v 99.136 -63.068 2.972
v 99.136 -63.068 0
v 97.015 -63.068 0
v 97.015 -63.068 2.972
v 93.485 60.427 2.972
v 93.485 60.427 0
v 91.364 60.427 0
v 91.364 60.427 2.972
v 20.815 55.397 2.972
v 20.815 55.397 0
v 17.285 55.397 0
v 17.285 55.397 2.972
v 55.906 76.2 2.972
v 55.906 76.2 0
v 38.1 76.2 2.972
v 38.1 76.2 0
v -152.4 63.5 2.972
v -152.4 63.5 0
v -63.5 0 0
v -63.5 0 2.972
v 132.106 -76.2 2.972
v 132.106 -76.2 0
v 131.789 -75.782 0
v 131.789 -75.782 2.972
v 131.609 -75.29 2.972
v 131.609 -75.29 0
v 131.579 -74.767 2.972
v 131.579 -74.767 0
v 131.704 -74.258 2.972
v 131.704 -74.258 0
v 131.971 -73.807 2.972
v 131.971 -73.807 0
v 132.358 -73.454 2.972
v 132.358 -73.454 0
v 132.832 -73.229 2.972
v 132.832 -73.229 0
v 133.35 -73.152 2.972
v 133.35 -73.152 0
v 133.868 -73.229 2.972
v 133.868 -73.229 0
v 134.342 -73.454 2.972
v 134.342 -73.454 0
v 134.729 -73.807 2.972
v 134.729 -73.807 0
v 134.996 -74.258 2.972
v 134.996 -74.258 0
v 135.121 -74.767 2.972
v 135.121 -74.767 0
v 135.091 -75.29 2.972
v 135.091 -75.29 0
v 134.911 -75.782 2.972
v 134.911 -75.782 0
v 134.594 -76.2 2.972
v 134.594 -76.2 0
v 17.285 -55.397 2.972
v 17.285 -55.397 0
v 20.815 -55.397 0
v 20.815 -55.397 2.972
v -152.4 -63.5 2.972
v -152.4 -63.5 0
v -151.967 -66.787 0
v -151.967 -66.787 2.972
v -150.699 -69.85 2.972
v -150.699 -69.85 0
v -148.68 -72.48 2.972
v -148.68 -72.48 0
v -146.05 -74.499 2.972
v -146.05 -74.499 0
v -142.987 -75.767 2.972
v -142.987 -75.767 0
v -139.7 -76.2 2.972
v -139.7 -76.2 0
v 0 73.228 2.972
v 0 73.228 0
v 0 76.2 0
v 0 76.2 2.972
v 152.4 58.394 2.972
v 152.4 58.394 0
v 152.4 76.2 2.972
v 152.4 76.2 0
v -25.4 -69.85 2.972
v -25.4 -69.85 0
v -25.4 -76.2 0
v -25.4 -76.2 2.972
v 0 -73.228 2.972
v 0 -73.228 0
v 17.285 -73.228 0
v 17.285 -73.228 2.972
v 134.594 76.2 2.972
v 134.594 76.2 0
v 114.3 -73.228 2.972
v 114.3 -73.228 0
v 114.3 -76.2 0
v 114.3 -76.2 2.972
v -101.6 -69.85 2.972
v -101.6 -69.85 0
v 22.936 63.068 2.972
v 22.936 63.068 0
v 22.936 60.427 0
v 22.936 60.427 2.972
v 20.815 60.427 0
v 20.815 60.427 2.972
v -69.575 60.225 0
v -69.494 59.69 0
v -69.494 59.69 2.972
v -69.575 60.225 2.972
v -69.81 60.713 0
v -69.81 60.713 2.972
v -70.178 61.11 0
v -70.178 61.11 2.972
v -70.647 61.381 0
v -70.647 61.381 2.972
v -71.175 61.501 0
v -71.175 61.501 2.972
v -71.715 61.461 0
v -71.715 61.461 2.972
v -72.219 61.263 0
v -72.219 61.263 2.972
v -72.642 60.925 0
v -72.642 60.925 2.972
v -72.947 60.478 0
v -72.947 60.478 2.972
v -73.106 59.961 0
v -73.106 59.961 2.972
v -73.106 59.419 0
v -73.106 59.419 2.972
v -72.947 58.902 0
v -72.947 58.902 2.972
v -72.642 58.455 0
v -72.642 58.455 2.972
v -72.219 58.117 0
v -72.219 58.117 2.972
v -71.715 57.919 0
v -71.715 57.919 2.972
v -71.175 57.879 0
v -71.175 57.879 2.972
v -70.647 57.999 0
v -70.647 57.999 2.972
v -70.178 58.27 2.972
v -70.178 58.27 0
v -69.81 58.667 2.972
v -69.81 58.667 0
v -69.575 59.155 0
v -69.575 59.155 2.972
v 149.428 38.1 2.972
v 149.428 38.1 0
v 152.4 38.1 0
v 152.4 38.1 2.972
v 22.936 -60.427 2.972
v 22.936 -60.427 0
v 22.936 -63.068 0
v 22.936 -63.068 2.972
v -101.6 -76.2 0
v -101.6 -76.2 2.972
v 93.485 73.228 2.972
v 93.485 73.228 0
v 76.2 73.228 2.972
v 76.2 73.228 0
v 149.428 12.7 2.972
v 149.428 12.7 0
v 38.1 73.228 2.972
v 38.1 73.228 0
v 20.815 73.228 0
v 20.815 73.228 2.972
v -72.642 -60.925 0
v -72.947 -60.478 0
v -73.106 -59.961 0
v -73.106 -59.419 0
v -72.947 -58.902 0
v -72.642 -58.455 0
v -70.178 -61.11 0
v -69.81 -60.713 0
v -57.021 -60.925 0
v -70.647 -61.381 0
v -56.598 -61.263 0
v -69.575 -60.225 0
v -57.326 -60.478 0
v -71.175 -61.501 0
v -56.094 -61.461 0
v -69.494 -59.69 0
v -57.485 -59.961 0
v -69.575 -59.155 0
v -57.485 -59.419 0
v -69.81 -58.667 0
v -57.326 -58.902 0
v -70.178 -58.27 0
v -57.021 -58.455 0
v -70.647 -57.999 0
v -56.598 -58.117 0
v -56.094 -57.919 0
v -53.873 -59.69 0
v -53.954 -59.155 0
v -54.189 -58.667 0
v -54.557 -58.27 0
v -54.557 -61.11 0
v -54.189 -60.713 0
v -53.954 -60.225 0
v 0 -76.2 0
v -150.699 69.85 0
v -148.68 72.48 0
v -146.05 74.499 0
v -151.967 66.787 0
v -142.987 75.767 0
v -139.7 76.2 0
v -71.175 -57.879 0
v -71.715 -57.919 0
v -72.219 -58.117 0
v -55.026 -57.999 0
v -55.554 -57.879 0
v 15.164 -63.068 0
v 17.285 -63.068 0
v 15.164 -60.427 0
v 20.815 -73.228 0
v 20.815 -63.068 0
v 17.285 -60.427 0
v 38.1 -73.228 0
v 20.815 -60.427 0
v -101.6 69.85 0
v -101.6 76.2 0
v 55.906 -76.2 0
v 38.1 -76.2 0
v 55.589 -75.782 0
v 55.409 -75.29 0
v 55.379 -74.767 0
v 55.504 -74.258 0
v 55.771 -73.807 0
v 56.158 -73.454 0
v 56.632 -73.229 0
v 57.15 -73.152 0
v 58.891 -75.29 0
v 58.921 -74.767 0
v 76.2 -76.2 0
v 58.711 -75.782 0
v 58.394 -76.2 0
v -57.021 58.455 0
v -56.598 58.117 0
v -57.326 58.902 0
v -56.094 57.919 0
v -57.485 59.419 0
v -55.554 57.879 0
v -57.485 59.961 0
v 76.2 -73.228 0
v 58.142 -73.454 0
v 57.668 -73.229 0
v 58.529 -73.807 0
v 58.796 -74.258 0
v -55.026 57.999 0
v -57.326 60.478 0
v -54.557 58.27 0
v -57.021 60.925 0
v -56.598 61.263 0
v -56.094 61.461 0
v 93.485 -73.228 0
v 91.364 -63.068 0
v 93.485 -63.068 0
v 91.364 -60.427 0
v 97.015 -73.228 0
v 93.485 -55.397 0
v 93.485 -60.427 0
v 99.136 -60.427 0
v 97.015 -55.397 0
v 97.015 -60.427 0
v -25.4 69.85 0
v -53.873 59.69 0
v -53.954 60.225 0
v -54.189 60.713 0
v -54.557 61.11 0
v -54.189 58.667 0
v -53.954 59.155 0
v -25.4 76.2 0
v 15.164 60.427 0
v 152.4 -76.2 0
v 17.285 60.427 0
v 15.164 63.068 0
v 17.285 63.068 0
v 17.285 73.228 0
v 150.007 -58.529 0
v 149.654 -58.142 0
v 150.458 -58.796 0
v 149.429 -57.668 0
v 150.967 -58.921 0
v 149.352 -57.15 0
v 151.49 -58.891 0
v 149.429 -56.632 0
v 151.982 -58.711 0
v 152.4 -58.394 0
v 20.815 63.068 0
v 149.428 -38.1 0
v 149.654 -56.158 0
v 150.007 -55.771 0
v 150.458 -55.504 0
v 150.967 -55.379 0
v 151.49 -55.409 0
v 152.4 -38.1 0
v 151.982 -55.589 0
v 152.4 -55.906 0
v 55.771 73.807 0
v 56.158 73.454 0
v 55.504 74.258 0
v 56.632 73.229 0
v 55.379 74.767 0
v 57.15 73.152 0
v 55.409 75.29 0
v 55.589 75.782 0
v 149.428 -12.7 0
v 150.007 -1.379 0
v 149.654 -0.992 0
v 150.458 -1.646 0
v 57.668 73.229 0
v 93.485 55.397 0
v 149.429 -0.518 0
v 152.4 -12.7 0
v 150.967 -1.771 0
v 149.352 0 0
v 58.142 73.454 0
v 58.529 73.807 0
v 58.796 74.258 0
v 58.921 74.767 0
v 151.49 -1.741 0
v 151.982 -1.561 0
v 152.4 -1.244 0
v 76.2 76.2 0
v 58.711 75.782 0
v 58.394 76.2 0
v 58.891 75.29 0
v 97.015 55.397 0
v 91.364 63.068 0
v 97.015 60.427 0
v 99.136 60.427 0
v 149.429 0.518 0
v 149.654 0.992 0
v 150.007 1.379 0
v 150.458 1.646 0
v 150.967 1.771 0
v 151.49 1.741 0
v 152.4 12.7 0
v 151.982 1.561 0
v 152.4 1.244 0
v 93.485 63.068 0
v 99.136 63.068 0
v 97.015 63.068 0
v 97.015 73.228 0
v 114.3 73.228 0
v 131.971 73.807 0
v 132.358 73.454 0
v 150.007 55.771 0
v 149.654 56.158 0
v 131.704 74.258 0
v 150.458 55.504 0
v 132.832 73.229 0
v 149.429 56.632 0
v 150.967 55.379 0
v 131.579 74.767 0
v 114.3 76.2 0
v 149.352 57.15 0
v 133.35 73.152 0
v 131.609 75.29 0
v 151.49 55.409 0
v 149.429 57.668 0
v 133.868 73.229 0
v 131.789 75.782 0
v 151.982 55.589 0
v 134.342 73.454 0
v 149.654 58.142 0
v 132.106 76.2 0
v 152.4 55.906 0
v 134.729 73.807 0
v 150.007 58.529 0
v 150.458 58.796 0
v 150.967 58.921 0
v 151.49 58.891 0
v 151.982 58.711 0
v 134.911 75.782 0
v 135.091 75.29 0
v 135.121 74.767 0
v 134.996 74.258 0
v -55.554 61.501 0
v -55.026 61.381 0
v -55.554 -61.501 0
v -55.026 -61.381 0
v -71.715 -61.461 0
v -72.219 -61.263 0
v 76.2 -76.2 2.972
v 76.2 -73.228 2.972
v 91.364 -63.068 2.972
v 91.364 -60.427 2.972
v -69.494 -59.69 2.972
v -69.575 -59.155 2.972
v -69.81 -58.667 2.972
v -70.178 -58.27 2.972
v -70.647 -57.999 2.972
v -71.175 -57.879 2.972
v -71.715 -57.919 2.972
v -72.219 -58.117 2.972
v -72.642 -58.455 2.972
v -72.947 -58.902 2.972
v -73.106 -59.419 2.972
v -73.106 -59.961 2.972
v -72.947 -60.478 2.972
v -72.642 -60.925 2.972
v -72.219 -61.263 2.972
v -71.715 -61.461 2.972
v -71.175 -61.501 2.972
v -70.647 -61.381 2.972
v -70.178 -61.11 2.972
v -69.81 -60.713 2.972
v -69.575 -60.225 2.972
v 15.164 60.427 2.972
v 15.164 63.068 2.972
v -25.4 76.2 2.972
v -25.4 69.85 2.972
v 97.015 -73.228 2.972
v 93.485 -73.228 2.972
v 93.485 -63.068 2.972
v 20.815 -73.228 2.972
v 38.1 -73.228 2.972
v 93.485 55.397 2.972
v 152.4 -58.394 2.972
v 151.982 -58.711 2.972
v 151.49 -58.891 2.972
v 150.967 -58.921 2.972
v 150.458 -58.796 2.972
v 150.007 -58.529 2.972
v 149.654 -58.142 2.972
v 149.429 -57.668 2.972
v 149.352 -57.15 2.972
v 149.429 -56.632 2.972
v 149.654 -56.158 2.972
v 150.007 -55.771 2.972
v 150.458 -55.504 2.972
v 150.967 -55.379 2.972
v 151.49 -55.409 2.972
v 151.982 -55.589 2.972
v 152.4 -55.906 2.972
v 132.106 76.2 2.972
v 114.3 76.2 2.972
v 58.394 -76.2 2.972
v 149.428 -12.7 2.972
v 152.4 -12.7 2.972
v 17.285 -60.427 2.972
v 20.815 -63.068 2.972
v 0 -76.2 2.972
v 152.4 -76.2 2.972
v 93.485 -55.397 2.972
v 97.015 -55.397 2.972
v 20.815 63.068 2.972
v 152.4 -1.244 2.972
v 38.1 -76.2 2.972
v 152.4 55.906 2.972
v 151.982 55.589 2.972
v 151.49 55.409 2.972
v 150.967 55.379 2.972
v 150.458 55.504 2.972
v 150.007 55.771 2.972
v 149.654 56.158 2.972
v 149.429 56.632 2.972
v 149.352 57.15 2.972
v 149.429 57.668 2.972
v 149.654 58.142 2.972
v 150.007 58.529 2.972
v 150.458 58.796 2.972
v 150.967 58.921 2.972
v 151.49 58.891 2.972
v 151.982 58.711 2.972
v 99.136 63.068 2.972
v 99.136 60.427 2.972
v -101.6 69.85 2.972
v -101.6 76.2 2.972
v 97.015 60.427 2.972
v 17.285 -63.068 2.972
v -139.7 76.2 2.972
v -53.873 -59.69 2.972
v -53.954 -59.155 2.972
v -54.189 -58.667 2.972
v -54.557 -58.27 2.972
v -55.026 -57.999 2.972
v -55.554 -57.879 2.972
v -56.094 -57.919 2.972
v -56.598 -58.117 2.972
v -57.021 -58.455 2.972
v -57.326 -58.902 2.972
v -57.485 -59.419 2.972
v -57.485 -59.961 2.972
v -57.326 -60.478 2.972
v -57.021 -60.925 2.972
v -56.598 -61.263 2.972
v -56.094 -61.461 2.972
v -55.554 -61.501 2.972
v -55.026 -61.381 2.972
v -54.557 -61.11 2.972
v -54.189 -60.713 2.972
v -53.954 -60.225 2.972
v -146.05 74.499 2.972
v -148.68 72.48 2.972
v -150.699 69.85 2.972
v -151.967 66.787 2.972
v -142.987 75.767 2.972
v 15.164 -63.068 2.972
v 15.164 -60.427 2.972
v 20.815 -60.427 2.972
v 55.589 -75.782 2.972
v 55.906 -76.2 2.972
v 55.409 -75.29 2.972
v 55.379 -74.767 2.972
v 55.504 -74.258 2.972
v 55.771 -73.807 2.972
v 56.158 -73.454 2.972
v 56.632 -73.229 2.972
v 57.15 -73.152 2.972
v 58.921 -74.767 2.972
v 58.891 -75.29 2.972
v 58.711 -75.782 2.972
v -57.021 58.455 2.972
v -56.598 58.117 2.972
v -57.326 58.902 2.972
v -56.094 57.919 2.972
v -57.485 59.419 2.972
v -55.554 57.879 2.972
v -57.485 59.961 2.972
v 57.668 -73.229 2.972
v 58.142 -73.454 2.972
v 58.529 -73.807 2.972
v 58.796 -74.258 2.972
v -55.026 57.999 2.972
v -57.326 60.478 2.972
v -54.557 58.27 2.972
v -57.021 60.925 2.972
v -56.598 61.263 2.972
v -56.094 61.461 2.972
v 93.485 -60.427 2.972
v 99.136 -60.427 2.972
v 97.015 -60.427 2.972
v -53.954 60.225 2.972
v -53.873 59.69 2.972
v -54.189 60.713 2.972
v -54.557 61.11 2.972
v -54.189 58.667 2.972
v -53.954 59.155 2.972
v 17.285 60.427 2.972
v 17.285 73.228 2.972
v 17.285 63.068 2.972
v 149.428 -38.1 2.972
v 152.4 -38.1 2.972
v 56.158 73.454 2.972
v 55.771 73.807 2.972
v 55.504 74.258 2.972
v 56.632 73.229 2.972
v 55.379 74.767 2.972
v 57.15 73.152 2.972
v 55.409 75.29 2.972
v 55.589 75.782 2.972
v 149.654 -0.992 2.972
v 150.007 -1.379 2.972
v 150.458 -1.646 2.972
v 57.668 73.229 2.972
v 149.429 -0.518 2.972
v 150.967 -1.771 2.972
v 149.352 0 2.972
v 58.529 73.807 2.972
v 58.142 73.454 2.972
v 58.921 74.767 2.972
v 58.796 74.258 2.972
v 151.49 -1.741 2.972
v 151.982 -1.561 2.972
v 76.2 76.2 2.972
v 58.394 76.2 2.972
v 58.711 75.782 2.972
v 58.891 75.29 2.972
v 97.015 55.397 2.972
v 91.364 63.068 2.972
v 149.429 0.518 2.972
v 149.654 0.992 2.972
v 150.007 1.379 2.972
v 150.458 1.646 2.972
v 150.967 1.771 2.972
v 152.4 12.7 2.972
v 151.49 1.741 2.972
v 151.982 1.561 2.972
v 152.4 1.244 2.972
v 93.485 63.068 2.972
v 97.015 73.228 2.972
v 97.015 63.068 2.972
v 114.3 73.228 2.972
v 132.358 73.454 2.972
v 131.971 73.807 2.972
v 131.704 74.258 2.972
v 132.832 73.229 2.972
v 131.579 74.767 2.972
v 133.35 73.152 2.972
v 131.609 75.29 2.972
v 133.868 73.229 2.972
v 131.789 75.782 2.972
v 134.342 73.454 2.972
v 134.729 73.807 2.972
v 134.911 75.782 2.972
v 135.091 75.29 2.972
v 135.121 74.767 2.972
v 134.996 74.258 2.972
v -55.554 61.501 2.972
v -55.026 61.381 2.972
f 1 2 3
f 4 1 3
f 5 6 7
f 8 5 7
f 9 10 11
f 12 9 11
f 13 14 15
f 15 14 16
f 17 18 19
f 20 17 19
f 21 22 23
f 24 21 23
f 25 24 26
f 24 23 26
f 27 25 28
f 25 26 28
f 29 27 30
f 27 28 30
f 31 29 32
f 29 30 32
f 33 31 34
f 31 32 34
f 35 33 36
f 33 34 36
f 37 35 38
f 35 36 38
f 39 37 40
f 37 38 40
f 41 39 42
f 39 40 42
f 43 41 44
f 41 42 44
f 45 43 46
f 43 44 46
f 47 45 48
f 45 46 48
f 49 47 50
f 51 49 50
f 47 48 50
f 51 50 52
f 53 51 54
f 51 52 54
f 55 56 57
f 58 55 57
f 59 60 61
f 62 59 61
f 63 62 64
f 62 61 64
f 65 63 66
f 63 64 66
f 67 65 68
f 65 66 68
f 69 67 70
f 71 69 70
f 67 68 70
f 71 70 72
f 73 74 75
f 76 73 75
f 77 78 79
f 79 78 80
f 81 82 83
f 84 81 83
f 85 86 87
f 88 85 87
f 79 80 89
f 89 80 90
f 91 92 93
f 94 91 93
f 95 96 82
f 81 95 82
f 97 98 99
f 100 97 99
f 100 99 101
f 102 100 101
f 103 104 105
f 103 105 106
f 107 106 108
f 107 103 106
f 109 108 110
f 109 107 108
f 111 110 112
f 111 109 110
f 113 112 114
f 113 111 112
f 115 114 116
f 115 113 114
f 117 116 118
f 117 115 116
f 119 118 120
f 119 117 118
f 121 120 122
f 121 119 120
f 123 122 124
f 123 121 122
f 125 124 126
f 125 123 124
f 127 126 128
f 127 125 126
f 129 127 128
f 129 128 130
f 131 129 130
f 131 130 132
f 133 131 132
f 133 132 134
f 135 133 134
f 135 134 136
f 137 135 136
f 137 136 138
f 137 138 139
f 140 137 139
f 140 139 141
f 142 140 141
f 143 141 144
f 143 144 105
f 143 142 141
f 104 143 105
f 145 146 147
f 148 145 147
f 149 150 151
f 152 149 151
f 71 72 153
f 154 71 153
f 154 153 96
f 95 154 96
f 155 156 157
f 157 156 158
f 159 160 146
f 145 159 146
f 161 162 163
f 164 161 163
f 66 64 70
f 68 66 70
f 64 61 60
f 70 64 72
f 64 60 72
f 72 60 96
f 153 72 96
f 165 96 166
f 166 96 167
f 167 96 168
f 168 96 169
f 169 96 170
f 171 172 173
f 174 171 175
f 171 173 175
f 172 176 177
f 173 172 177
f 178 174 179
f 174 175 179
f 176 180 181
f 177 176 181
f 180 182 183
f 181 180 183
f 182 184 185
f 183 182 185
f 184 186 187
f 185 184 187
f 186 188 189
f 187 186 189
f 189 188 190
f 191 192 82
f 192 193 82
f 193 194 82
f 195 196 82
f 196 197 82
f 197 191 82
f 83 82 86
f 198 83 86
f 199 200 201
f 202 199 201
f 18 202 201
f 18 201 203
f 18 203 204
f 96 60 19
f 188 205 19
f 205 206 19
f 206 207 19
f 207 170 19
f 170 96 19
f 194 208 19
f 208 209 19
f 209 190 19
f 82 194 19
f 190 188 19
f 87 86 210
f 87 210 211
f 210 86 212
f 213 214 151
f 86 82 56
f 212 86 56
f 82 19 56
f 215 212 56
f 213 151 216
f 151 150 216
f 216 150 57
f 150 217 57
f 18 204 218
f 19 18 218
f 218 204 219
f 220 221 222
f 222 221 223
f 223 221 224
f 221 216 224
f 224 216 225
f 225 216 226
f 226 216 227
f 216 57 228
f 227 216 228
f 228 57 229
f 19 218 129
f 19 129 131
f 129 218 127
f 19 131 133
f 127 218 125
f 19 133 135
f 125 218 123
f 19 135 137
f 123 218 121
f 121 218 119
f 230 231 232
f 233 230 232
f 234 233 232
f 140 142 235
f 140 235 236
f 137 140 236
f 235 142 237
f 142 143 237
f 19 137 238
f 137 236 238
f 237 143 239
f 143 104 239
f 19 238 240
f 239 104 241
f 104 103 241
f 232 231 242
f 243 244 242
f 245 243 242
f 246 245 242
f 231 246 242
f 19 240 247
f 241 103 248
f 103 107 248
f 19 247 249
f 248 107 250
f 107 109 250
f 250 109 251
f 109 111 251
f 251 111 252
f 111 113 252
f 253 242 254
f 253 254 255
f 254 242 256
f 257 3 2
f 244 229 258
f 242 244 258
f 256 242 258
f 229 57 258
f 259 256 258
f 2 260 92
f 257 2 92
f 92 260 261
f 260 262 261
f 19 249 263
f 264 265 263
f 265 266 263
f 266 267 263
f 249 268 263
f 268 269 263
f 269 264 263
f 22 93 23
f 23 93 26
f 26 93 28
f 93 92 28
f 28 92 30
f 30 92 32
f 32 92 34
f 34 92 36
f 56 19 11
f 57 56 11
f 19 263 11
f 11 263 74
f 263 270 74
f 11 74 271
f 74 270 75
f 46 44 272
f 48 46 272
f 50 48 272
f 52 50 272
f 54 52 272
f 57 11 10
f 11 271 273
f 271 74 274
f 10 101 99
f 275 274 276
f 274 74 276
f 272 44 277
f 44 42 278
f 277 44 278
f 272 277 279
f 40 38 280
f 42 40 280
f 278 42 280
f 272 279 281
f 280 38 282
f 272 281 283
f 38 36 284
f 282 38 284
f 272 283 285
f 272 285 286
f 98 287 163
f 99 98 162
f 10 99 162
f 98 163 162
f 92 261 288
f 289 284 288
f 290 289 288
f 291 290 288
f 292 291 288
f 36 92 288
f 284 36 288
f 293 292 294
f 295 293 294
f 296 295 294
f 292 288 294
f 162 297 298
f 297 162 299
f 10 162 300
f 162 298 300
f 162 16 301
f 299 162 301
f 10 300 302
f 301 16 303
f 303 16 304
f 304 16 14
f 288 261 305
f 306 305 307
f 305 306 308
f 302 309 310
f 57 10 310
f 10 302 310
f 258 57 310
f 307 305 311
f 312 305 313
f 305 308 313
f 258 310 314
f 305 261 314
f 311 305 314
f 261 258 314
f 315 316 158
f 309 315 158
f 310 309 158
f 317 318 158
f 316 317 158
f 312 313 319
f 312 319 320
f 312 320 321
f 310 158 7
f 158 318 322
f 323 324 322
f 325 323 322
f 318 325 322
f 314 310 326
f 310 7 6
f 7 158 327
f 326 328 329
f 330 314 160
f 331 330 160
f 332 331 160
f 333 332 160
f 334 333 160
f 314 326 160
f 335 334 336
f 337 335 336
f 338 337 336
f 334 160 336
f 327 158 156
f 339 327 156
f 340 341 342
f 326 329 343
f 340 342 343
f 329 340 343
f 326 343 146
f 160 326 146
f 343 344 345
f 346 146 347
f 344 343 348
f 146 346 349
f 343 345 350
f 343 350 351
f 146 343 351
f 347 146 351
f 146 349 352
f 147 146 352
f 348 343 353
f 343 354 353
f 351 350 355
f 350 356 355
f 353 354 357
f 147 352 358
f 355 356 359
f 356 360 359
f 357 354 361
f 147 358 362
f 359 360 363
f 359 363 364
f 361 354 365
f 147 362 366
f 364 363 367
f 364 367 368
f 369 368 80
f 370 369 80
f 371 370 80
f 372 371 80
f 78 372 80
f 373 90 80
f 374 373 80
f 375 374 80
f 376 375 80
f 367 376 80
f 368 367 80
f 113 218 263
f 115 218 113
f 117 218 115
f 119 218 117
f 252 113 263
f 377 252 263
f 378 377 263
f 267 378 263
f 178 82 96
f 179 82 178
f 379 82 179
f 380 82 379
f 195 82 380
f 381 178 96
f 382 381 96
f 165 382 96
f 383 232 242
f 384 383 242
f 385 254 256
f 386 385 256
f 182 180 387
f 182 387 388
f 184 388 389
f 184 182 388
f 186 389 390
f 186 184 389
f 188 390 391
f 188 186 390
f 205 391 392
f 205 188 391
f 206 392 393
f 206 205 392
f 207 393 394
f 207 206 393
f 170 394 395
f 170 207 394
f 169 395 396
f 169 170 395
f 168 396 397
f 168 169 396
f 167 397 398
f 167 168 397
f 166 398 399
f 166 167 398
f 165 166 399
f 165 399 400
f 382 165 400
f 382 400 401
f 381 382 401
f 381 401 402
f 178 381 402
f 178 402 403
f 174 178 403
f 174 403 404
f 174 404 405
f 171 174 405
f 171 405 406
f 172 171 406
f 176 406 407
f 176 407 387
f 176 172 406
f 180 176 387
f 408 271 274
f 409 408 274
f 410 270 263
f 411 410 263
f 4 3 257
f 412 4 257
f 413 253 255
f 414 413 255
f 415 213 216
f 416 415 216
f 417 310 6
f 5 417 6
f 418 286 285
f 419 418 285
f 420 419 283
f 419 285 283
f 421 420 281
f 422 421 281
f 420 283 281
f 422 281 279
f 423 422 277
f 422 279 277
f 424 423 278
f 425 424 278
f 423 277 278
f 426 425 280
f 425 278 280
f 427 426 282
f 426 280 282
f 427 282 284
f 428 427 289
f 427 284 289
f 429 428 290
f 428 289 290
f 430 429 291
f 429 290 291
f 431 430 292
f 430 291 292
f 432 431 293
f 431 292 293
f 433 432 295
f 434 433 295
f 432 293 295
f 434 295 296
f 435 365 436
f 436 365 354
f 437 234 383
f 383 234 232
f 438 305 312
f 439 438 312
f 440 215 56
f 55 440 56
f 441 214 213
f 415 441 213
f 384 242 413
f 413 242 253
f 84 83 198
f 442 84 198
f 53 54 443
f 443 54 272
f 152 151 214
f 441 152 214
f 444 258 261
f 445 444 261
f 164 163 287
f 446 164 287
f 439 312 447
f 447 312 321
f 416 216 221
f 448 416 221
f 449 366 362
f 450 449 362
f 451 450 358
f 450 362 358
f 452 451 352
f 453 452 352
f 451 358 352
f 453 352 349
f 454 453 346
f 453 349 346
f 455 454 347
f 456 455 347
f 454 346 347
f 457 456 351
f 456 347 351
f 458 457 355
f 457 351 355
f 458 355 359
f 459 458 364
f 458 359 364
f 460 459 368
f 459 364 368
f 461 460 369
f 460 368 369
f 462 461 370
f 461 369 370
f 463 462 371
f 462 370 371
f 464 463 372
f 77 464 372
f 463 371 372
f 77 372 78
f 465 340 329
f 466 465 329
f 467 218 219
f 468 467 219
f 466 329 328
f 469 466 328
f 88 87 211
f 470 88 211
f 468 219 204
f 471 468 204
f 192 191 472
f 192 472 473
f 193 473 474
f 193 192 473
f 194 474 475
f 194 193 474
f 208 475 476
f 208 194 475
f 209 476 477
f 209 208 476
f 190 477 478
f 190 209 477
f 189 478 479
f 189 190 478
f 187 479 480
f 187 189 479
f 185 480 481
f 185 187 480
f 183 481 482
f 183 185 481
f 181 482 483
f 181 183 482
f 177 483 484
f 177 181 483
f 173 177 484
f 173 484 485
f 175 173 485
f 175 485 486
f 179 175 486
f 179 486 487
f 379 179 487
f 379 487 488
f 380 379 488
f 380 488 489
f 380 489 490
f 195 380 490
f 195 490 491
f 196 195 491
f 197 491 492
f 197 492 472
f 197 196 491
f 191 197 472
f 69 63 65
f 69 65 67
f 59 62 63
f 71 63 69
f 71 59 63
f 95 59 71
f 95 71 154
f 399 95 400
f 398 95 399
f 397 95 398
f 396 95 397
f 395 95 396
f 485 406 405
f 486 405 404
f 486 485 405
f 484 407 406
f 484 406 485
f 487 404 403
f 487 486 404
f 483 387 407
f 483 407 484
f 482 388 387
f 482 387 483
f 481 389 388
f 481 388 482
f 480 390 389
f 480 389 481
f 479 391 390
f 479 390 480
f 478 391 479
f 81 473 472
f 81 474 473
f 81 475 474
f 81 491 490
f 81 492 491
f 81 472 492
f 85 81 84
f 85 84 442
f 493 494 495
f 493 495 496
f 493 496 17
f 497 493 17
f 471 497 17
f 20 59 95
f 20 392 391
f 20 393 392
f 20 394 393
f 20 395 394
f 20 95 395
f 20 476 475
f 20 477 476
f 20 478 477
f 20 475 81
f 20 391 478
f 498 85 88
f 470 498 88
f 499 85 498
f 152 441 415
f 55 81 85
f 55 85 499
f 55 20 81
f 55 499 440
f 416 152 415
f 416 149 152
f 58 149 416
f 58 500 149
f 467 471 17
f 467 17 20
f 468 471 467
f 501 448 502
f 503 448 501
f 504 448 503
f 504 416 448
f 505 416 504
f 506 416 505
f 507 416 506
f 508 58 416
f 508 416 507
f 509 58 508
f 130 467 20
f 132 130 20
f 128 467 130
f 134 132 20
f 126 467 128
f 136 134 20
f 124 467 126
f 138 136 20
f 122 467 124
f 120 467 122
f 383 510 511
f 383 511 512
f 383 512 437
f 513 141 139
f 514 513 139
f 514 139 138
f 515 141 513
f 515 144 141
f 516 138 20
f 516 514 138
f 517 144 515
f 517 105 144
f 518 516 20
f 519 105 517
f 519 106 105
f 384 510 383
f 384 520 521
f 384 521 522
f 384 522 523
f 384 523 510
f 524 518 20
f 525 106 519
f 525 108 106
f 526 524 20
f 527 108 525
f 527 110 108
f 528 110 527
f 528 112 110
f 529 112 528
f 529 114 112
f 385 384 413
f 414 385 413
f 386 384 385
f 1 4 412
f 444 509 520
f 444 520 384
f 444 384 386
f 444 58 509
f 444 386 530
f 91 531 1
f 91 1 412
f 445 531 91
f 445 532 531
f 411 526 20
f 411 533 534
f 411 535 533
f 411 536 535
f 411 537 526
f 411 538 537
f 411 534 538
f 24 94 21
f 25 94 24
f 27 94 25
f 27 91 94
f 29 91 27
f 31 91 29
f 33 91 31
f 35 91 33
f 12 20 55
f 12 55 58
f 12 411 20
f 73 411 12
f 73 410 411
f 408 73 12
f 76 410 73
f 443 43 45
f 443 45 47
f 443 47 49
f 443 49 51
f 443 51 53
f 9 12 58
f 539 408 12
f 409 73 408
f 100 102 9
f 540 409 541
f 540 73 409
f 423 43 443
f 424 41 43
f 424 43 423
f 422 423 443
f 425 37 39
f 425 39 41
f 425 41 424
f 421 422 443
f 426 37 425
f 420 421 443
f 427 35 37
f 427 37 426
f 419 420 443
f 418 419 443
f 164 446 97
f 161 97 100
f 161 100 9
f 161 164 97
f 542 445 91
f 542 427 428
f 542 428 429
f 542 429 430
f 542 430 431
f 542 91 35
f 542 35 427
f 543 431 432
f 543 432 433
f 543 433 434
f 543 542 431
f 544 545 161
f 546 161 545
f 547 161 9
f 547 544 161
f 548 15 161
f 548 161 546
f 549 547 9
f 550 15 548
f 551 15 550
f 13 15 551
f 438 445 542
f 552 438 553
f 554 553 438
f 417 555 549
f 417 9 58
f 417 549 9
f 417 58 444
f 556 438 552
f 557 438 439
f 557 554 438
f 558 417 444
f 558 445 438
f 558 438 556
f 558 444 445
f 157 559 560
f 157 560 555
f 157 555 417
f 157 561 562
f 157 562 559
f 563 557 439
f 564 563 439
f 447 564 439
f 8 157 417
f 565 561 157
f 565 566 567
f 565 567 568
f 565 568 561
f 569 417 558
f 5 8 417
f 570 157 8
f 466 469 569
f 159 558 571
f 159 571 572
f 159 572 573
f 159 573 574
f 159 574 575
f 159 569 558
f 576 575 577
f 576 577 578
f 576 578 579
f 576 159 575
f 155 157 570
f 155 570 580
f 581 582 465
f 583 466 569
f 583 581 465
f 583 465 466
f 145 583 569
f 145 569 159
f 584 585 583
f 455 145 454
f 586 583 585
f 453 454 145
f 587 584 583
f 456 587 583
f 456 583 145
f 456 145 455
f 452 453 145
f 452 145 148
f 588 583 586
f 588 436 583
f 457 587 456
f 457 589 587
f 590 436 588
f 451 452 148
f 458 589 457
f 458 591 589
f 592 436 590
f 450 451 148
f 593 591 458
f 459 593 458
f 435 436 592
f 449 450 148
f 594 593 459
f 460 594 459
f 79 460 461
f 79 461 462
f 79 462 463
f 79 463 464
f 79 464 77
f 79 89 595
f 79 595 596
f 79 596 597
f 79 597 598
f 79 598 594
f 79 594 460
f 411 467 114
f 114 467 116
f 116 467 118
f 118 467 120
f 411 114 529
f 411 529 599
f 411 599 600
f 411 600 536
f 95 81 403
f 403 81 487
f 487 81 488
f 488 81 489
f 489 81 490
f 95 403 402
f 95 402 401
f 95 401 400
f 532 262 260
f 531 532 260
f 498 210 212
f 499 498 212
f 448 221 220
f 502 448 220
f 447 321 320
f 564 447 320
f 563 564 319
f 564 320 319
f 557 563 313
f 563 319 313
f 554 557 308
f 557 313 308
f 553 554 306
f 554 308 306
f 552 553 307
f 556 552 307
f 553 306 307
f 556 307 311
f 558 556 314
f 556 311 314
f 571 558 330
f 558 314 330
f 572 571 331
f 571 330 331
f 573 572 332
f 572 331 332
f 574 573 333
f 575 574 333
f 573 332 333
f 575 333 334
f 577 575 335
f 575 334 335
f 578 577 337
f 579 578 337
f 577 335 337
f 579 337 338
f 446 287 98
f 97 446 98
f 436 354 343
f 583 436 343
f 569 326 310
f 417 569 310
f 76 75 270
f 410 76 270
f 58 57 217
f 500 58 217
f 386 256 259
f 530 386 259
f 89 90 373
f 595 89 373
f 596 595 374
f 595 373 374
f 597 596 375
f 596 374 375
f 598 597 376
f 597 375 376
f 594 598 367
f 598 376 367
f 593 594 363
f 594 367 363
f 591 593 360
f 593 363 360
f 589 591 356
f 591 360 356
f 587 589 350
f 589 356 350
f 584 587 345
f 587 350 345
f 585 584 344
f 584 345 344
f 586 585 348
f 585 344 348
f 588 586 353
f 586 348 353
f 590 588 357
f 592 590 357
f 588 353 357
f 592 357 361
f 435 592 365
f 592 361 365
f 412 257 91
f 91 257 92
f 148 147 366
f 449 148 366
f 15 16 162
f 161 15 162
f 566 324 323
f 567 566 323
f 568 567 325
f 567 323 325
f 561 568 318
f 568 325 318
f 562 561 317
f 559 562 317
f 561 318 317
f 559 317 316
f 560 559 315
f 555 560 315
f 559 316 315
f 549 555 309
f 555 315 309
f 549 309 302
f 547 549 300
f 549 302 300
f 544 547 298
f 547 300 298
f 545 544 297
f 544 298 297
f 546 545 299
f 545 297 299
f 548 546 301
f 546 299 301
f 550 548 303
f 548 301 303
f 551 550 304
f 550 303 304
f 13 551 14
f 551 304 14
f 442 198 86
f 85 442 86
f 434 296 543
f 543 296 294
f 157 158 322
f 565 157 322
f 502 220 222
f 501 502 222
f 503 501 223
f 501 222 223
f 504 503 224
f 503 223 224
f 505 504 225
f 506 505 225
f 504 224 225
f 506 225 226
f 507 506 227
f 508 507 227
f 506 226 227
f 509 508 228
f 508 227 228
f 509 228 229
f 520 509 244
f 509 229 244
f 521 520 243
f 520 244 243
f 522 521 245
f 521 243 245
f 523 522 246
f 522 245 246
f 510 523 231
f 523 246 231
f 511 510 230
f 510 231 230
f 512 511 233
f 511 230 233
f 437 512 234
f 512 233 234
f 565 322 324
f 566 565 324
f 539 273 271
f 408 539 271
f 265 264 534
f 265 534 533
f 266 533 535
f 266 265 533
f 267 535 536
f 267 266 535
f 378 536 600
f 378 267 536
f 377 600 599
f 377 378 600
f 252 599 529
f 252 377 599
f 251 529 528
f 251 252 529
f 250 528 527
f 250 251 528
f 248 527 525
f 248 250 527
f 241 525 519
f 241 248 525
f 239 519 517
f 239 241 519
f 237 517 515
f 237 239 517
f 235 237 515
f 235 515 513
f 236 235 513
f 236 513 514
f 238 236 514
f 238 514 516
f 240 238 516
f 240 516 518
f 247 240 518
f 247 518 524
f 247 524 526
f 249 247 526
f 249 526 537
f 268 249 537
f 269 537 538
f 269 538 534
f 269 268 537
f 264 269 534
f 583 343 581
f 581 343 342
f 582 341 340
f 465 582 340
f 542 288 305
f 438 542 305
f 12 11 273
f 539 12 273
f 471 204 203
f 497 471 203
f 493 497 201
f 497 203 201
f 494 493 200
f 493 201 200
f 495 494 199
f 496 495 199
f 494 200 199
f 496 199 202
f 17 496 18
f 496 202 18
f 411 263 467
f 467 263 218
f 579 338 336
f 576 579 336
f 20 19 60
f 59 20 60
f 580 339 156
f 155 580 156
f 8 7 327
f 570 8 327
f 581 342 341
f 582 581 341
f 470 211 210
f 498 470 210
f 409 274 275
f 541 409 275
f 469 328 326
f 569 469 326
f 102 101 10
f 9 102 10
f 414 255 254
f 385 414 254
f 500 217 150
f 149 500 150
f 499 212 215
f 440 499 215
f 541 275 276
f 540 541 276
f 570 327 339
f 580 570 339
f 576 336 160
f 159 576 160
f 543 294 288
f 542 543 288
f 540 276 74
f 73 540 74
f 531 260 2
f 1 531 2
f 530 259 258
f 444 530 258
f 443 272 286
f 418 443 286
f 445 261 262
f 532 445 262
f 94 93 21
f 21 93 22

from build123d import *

# Parameters (mm, degrees)
F0_R     = 1.8161
F1_DEPTH = 2.9718


with BuildPart() as f1:
    # F0 (on Top) → F1 (new body)
    with BuildSketch(Plane.XY):
        with BuildLine():
            Line((134.594341, -76.2), (152.4, -76.2))
            Line((152.4, -76.2), (152.4, -58.394341))
            ThreePointArc((152.4, -58.394341), (149.352, -57.15), (152.4, -55.905659))
            Line((152.4, -55.905659), (152.4, -38.1))
            Line((152.4, -38.1), (149.4282, -38.1))
            Line((149.4282, -38.1), (149.4282, -12.7))
            Line((149.4282, -12.7), (152.4, -12.7))
            Line((152.4, -12.7), (152.4, -1.244341))
            ThreePointArc((152.4, -1.244341), (149.352, 0), (152.4, 1.244341))
            Line((152.4, 1.244341), (152.4, 12.7))
            Line((152.4, 12.7), (149.4282, 12.7))
            Line((149.4282, 12.7), (149.4282, 38.1))
            Line((149.4282, 38.1), (152.4, 38.1))
            Line((152.4, 38.1), (152.4, 55.905659))
            ThreePointArc((152.4, 55.905659), (149.352, 57.15), (152.4, 58.394341))
            Line((152.4, 58.394341), (152.4, 76.2))
            Line((152.4, 76.2), (134.594341, 76.2))
            ThreePointArc((134.594341, 76.2), (133.35, 73.152), (132.105659, 76.2))
            Line((132.105659, 76.2), (114.3, 76.2))
            Line((114.3, 76.2), (114.3, 73.2282))
            Line((114.3, 73.2282), (97.0153, 73.2282))
            Line((97.0153, 73.2282), (97.0153, 63.0682))
            Line((97.0153, 63.0682), (99.1362, 63.0682))
            Line((99.1362, 63.0682), (99.1362, 60.4266))
            Line((99.1362, 60.4266), (97.0153, 60.4266))
            Line((97.0153, 60.4266), (97.0153, 55.3974))
            Line((97.0153, 55.3974), (93.4847, 55.3974))
            Line((93.4847, 55.3974), (93.4847, 60.4266))
            Line((93.4847, 60.4266), (91.3638, 60.4266))
            Line((91.3638, 60.4266), (91.3638, 63.0682))
            Line((91.3638, 63.0682), (93.4847, 63.0682))
            Line((93.4847, 63.0682), (93.4847, 73.2282))
            Line((93.4847, 73.2282), (76.2, 73.2282))
            Line((76.2, 73.2282), (76.2, 76.2))
            Line((76.2, 76.2), (58.394341, 76.2))
            ThreePointArc((58.394341, 76.2), (57.15, 73.152), (55.905659, 76.2))
            Line((55.905659, 76.2), (38.1, 76.2))
            Line((38.1, 76.2), (38.1, 73.2282))
            Line((38.1, 73.2282), (20.8153, 73.2282))
            Line((20.8153, 73.2282), (20.8153, 63.0682))
            Line((20.8153, 63.0682), (22.9362, 63.0682))
            Line((22.9362, 63.0682), (22.9362, 60.4266))
            Line((22.9362, 60.4266), (20.8153, 60.4266))
            Line((20.8153, 60.4266), (20.8153, 55.3974))
            Line((20.8153, 55.3974), (17.2847, 55.3974))
            Line((17.2847, 55.3974), (17.2847, 60.4266))
            Line((17.2847, 60.4266), (15.1638, 60.4266))
            Line((15.1638, 60.4266), (15.1638, 63.0682))
            Line((15.1638, 63.0682), (17.2847, 63.0682))
            Line((17.2847, 63.0682), (17.2847, 73.2282))
            Line((17.2847, 73.2282), (0, 73.2282))
            Line((0, 73.2282), (0, 76.2))
            Line((0, 76.2), (-25.4, 76.2))
            Line((-25.4, 76.2), (-25.4, 69.85))
            Line((-25.4, 69.85), (-101.6, 69.85))
            Line((-101.6, 69.85), (-101.6, 76.2))
            Line((-101.6, 76.2), (-139.7, 76.2))
            ThreePointArc((-139.7, 76.2), (-148.680256, 72.480256), (-152.4, 63.5))
            Line((-152.4, 63.5), (-63.5, 0))
            Line((-63.5, 0), (-152.4, -63.5))
            ThreePointArc((-152.4, -63.5), (-148.680256, -72.480256), (-139.7, -76.2))
            Line((-139.7, -76.2), (-101.6, -76.2))
            Line((-101.6, -76.2), (-101.6, -69.85))
            Line((-101.6, -69.85), (-25.4, -69.85))
            Line((-25.4, -69.85), (-25.4, -76.2))
            Line((-25.4, -76.2), (0, -76.2))
            Line((0, -76.2), (0, -73.2282))
            Line((0, -73.2282), (17.2847, -73.2282))
            Line((17.2847, -73.2282), (17.2847, -63.0682))
            Line((17.2847, -63.0682), (15.1638, -63.0682))
            Line((15.1638, -63.0682), (15.1638, -60.4266))
            Line((15.1638, -60.4266), (17.2847, -60.4266))
            Line((17.2847, -60.4266), (17.2847, -55.3974))
            Line((17.2847, -55.3974), (20.8153, -55.3974))
            Line((20.8153, -55.3974), (20.8153, -60.4266))
            Line((20.8153, -60.4266), (22.9362, -60.4266))
            Line((22.9362, -60.4266), (22.9362, -63.0682))
            Line((22.9362, -63.0682), (20.8153, -63.0682))
            Line((20.8153, -63.0682), (20.8153, -73.2282))
            Line((20.8153, -73.2282), (38.1, -73.2282))
            Line((38.1, -73.2282), (38.1, -76.2))
            Line((38.1, -76.2), (55.905659, -76.2))
            ThreePointArc((55.905659, -76.2), (57.15, -73.152), (58.394341, -76.2))
            Line((58.394341, -76.2), (76.2, -76.2))
            Line((76.2, -76.2), (76.2, -73.2282))
            Line((76.2, -73.2282), (93.4847, -73.2282))
            Line((93.4847, -73.2282), (93.4847, -63.0682))
            Line((93.4847, -63.0682), (91.3638, -63.0682))
            Line((91.3638, -63.0682), (91.3638, -60.4266))
            Line((91.3638, -60.4266), (93.4847, -60.4266))
            Line((93.4847, -60.4266), (93.4847, -55.3974))
            Line((93.4847, -55.3974), (97.0153, -55.3974))
            Line((97.0153, -55.3974), (97.0153, -60.4266))
            Line((97.0153, -60.4266), (99.1362, -60.4266))
            Line((99.1362, -60.4266), (99.1362, -63.0682))
            Line((99.1362, -63.0682), (97.0153, -63.0682))
            Line((97.0153, -63.0682), (97.0153, -73.2282))
            Line((97.0153, -73.2282), (114.3, -73.2282))
            Line((114.3, -73.2282), (114.3, -76.2))
            Line((114.3, -76.2), (132.105659, -76.2))
            ThreePointArc((132.105659, -76.2), (133.35, -73.152), (134.594341, -76.2))
        make_face()
        with Locations((-71.3105, -59.69)):
            Circle(F0_R, mode=Mode.SUBTRACT)
        with Locations((-55.6895, -59.69)):
            Circle(F0_R, mode=Mode.SUBTRACT)
        with Locations((-71.3105, 59.69)):
            Circle(F0_R, mode=Mode.SUBTRACT)
        with Locations((-55.6895, 59.69)):
            Circle(F0_R, mode=Mode.SUBTRACT)
    extrude(amount=F1_DEPTH)


solid = f1.part
